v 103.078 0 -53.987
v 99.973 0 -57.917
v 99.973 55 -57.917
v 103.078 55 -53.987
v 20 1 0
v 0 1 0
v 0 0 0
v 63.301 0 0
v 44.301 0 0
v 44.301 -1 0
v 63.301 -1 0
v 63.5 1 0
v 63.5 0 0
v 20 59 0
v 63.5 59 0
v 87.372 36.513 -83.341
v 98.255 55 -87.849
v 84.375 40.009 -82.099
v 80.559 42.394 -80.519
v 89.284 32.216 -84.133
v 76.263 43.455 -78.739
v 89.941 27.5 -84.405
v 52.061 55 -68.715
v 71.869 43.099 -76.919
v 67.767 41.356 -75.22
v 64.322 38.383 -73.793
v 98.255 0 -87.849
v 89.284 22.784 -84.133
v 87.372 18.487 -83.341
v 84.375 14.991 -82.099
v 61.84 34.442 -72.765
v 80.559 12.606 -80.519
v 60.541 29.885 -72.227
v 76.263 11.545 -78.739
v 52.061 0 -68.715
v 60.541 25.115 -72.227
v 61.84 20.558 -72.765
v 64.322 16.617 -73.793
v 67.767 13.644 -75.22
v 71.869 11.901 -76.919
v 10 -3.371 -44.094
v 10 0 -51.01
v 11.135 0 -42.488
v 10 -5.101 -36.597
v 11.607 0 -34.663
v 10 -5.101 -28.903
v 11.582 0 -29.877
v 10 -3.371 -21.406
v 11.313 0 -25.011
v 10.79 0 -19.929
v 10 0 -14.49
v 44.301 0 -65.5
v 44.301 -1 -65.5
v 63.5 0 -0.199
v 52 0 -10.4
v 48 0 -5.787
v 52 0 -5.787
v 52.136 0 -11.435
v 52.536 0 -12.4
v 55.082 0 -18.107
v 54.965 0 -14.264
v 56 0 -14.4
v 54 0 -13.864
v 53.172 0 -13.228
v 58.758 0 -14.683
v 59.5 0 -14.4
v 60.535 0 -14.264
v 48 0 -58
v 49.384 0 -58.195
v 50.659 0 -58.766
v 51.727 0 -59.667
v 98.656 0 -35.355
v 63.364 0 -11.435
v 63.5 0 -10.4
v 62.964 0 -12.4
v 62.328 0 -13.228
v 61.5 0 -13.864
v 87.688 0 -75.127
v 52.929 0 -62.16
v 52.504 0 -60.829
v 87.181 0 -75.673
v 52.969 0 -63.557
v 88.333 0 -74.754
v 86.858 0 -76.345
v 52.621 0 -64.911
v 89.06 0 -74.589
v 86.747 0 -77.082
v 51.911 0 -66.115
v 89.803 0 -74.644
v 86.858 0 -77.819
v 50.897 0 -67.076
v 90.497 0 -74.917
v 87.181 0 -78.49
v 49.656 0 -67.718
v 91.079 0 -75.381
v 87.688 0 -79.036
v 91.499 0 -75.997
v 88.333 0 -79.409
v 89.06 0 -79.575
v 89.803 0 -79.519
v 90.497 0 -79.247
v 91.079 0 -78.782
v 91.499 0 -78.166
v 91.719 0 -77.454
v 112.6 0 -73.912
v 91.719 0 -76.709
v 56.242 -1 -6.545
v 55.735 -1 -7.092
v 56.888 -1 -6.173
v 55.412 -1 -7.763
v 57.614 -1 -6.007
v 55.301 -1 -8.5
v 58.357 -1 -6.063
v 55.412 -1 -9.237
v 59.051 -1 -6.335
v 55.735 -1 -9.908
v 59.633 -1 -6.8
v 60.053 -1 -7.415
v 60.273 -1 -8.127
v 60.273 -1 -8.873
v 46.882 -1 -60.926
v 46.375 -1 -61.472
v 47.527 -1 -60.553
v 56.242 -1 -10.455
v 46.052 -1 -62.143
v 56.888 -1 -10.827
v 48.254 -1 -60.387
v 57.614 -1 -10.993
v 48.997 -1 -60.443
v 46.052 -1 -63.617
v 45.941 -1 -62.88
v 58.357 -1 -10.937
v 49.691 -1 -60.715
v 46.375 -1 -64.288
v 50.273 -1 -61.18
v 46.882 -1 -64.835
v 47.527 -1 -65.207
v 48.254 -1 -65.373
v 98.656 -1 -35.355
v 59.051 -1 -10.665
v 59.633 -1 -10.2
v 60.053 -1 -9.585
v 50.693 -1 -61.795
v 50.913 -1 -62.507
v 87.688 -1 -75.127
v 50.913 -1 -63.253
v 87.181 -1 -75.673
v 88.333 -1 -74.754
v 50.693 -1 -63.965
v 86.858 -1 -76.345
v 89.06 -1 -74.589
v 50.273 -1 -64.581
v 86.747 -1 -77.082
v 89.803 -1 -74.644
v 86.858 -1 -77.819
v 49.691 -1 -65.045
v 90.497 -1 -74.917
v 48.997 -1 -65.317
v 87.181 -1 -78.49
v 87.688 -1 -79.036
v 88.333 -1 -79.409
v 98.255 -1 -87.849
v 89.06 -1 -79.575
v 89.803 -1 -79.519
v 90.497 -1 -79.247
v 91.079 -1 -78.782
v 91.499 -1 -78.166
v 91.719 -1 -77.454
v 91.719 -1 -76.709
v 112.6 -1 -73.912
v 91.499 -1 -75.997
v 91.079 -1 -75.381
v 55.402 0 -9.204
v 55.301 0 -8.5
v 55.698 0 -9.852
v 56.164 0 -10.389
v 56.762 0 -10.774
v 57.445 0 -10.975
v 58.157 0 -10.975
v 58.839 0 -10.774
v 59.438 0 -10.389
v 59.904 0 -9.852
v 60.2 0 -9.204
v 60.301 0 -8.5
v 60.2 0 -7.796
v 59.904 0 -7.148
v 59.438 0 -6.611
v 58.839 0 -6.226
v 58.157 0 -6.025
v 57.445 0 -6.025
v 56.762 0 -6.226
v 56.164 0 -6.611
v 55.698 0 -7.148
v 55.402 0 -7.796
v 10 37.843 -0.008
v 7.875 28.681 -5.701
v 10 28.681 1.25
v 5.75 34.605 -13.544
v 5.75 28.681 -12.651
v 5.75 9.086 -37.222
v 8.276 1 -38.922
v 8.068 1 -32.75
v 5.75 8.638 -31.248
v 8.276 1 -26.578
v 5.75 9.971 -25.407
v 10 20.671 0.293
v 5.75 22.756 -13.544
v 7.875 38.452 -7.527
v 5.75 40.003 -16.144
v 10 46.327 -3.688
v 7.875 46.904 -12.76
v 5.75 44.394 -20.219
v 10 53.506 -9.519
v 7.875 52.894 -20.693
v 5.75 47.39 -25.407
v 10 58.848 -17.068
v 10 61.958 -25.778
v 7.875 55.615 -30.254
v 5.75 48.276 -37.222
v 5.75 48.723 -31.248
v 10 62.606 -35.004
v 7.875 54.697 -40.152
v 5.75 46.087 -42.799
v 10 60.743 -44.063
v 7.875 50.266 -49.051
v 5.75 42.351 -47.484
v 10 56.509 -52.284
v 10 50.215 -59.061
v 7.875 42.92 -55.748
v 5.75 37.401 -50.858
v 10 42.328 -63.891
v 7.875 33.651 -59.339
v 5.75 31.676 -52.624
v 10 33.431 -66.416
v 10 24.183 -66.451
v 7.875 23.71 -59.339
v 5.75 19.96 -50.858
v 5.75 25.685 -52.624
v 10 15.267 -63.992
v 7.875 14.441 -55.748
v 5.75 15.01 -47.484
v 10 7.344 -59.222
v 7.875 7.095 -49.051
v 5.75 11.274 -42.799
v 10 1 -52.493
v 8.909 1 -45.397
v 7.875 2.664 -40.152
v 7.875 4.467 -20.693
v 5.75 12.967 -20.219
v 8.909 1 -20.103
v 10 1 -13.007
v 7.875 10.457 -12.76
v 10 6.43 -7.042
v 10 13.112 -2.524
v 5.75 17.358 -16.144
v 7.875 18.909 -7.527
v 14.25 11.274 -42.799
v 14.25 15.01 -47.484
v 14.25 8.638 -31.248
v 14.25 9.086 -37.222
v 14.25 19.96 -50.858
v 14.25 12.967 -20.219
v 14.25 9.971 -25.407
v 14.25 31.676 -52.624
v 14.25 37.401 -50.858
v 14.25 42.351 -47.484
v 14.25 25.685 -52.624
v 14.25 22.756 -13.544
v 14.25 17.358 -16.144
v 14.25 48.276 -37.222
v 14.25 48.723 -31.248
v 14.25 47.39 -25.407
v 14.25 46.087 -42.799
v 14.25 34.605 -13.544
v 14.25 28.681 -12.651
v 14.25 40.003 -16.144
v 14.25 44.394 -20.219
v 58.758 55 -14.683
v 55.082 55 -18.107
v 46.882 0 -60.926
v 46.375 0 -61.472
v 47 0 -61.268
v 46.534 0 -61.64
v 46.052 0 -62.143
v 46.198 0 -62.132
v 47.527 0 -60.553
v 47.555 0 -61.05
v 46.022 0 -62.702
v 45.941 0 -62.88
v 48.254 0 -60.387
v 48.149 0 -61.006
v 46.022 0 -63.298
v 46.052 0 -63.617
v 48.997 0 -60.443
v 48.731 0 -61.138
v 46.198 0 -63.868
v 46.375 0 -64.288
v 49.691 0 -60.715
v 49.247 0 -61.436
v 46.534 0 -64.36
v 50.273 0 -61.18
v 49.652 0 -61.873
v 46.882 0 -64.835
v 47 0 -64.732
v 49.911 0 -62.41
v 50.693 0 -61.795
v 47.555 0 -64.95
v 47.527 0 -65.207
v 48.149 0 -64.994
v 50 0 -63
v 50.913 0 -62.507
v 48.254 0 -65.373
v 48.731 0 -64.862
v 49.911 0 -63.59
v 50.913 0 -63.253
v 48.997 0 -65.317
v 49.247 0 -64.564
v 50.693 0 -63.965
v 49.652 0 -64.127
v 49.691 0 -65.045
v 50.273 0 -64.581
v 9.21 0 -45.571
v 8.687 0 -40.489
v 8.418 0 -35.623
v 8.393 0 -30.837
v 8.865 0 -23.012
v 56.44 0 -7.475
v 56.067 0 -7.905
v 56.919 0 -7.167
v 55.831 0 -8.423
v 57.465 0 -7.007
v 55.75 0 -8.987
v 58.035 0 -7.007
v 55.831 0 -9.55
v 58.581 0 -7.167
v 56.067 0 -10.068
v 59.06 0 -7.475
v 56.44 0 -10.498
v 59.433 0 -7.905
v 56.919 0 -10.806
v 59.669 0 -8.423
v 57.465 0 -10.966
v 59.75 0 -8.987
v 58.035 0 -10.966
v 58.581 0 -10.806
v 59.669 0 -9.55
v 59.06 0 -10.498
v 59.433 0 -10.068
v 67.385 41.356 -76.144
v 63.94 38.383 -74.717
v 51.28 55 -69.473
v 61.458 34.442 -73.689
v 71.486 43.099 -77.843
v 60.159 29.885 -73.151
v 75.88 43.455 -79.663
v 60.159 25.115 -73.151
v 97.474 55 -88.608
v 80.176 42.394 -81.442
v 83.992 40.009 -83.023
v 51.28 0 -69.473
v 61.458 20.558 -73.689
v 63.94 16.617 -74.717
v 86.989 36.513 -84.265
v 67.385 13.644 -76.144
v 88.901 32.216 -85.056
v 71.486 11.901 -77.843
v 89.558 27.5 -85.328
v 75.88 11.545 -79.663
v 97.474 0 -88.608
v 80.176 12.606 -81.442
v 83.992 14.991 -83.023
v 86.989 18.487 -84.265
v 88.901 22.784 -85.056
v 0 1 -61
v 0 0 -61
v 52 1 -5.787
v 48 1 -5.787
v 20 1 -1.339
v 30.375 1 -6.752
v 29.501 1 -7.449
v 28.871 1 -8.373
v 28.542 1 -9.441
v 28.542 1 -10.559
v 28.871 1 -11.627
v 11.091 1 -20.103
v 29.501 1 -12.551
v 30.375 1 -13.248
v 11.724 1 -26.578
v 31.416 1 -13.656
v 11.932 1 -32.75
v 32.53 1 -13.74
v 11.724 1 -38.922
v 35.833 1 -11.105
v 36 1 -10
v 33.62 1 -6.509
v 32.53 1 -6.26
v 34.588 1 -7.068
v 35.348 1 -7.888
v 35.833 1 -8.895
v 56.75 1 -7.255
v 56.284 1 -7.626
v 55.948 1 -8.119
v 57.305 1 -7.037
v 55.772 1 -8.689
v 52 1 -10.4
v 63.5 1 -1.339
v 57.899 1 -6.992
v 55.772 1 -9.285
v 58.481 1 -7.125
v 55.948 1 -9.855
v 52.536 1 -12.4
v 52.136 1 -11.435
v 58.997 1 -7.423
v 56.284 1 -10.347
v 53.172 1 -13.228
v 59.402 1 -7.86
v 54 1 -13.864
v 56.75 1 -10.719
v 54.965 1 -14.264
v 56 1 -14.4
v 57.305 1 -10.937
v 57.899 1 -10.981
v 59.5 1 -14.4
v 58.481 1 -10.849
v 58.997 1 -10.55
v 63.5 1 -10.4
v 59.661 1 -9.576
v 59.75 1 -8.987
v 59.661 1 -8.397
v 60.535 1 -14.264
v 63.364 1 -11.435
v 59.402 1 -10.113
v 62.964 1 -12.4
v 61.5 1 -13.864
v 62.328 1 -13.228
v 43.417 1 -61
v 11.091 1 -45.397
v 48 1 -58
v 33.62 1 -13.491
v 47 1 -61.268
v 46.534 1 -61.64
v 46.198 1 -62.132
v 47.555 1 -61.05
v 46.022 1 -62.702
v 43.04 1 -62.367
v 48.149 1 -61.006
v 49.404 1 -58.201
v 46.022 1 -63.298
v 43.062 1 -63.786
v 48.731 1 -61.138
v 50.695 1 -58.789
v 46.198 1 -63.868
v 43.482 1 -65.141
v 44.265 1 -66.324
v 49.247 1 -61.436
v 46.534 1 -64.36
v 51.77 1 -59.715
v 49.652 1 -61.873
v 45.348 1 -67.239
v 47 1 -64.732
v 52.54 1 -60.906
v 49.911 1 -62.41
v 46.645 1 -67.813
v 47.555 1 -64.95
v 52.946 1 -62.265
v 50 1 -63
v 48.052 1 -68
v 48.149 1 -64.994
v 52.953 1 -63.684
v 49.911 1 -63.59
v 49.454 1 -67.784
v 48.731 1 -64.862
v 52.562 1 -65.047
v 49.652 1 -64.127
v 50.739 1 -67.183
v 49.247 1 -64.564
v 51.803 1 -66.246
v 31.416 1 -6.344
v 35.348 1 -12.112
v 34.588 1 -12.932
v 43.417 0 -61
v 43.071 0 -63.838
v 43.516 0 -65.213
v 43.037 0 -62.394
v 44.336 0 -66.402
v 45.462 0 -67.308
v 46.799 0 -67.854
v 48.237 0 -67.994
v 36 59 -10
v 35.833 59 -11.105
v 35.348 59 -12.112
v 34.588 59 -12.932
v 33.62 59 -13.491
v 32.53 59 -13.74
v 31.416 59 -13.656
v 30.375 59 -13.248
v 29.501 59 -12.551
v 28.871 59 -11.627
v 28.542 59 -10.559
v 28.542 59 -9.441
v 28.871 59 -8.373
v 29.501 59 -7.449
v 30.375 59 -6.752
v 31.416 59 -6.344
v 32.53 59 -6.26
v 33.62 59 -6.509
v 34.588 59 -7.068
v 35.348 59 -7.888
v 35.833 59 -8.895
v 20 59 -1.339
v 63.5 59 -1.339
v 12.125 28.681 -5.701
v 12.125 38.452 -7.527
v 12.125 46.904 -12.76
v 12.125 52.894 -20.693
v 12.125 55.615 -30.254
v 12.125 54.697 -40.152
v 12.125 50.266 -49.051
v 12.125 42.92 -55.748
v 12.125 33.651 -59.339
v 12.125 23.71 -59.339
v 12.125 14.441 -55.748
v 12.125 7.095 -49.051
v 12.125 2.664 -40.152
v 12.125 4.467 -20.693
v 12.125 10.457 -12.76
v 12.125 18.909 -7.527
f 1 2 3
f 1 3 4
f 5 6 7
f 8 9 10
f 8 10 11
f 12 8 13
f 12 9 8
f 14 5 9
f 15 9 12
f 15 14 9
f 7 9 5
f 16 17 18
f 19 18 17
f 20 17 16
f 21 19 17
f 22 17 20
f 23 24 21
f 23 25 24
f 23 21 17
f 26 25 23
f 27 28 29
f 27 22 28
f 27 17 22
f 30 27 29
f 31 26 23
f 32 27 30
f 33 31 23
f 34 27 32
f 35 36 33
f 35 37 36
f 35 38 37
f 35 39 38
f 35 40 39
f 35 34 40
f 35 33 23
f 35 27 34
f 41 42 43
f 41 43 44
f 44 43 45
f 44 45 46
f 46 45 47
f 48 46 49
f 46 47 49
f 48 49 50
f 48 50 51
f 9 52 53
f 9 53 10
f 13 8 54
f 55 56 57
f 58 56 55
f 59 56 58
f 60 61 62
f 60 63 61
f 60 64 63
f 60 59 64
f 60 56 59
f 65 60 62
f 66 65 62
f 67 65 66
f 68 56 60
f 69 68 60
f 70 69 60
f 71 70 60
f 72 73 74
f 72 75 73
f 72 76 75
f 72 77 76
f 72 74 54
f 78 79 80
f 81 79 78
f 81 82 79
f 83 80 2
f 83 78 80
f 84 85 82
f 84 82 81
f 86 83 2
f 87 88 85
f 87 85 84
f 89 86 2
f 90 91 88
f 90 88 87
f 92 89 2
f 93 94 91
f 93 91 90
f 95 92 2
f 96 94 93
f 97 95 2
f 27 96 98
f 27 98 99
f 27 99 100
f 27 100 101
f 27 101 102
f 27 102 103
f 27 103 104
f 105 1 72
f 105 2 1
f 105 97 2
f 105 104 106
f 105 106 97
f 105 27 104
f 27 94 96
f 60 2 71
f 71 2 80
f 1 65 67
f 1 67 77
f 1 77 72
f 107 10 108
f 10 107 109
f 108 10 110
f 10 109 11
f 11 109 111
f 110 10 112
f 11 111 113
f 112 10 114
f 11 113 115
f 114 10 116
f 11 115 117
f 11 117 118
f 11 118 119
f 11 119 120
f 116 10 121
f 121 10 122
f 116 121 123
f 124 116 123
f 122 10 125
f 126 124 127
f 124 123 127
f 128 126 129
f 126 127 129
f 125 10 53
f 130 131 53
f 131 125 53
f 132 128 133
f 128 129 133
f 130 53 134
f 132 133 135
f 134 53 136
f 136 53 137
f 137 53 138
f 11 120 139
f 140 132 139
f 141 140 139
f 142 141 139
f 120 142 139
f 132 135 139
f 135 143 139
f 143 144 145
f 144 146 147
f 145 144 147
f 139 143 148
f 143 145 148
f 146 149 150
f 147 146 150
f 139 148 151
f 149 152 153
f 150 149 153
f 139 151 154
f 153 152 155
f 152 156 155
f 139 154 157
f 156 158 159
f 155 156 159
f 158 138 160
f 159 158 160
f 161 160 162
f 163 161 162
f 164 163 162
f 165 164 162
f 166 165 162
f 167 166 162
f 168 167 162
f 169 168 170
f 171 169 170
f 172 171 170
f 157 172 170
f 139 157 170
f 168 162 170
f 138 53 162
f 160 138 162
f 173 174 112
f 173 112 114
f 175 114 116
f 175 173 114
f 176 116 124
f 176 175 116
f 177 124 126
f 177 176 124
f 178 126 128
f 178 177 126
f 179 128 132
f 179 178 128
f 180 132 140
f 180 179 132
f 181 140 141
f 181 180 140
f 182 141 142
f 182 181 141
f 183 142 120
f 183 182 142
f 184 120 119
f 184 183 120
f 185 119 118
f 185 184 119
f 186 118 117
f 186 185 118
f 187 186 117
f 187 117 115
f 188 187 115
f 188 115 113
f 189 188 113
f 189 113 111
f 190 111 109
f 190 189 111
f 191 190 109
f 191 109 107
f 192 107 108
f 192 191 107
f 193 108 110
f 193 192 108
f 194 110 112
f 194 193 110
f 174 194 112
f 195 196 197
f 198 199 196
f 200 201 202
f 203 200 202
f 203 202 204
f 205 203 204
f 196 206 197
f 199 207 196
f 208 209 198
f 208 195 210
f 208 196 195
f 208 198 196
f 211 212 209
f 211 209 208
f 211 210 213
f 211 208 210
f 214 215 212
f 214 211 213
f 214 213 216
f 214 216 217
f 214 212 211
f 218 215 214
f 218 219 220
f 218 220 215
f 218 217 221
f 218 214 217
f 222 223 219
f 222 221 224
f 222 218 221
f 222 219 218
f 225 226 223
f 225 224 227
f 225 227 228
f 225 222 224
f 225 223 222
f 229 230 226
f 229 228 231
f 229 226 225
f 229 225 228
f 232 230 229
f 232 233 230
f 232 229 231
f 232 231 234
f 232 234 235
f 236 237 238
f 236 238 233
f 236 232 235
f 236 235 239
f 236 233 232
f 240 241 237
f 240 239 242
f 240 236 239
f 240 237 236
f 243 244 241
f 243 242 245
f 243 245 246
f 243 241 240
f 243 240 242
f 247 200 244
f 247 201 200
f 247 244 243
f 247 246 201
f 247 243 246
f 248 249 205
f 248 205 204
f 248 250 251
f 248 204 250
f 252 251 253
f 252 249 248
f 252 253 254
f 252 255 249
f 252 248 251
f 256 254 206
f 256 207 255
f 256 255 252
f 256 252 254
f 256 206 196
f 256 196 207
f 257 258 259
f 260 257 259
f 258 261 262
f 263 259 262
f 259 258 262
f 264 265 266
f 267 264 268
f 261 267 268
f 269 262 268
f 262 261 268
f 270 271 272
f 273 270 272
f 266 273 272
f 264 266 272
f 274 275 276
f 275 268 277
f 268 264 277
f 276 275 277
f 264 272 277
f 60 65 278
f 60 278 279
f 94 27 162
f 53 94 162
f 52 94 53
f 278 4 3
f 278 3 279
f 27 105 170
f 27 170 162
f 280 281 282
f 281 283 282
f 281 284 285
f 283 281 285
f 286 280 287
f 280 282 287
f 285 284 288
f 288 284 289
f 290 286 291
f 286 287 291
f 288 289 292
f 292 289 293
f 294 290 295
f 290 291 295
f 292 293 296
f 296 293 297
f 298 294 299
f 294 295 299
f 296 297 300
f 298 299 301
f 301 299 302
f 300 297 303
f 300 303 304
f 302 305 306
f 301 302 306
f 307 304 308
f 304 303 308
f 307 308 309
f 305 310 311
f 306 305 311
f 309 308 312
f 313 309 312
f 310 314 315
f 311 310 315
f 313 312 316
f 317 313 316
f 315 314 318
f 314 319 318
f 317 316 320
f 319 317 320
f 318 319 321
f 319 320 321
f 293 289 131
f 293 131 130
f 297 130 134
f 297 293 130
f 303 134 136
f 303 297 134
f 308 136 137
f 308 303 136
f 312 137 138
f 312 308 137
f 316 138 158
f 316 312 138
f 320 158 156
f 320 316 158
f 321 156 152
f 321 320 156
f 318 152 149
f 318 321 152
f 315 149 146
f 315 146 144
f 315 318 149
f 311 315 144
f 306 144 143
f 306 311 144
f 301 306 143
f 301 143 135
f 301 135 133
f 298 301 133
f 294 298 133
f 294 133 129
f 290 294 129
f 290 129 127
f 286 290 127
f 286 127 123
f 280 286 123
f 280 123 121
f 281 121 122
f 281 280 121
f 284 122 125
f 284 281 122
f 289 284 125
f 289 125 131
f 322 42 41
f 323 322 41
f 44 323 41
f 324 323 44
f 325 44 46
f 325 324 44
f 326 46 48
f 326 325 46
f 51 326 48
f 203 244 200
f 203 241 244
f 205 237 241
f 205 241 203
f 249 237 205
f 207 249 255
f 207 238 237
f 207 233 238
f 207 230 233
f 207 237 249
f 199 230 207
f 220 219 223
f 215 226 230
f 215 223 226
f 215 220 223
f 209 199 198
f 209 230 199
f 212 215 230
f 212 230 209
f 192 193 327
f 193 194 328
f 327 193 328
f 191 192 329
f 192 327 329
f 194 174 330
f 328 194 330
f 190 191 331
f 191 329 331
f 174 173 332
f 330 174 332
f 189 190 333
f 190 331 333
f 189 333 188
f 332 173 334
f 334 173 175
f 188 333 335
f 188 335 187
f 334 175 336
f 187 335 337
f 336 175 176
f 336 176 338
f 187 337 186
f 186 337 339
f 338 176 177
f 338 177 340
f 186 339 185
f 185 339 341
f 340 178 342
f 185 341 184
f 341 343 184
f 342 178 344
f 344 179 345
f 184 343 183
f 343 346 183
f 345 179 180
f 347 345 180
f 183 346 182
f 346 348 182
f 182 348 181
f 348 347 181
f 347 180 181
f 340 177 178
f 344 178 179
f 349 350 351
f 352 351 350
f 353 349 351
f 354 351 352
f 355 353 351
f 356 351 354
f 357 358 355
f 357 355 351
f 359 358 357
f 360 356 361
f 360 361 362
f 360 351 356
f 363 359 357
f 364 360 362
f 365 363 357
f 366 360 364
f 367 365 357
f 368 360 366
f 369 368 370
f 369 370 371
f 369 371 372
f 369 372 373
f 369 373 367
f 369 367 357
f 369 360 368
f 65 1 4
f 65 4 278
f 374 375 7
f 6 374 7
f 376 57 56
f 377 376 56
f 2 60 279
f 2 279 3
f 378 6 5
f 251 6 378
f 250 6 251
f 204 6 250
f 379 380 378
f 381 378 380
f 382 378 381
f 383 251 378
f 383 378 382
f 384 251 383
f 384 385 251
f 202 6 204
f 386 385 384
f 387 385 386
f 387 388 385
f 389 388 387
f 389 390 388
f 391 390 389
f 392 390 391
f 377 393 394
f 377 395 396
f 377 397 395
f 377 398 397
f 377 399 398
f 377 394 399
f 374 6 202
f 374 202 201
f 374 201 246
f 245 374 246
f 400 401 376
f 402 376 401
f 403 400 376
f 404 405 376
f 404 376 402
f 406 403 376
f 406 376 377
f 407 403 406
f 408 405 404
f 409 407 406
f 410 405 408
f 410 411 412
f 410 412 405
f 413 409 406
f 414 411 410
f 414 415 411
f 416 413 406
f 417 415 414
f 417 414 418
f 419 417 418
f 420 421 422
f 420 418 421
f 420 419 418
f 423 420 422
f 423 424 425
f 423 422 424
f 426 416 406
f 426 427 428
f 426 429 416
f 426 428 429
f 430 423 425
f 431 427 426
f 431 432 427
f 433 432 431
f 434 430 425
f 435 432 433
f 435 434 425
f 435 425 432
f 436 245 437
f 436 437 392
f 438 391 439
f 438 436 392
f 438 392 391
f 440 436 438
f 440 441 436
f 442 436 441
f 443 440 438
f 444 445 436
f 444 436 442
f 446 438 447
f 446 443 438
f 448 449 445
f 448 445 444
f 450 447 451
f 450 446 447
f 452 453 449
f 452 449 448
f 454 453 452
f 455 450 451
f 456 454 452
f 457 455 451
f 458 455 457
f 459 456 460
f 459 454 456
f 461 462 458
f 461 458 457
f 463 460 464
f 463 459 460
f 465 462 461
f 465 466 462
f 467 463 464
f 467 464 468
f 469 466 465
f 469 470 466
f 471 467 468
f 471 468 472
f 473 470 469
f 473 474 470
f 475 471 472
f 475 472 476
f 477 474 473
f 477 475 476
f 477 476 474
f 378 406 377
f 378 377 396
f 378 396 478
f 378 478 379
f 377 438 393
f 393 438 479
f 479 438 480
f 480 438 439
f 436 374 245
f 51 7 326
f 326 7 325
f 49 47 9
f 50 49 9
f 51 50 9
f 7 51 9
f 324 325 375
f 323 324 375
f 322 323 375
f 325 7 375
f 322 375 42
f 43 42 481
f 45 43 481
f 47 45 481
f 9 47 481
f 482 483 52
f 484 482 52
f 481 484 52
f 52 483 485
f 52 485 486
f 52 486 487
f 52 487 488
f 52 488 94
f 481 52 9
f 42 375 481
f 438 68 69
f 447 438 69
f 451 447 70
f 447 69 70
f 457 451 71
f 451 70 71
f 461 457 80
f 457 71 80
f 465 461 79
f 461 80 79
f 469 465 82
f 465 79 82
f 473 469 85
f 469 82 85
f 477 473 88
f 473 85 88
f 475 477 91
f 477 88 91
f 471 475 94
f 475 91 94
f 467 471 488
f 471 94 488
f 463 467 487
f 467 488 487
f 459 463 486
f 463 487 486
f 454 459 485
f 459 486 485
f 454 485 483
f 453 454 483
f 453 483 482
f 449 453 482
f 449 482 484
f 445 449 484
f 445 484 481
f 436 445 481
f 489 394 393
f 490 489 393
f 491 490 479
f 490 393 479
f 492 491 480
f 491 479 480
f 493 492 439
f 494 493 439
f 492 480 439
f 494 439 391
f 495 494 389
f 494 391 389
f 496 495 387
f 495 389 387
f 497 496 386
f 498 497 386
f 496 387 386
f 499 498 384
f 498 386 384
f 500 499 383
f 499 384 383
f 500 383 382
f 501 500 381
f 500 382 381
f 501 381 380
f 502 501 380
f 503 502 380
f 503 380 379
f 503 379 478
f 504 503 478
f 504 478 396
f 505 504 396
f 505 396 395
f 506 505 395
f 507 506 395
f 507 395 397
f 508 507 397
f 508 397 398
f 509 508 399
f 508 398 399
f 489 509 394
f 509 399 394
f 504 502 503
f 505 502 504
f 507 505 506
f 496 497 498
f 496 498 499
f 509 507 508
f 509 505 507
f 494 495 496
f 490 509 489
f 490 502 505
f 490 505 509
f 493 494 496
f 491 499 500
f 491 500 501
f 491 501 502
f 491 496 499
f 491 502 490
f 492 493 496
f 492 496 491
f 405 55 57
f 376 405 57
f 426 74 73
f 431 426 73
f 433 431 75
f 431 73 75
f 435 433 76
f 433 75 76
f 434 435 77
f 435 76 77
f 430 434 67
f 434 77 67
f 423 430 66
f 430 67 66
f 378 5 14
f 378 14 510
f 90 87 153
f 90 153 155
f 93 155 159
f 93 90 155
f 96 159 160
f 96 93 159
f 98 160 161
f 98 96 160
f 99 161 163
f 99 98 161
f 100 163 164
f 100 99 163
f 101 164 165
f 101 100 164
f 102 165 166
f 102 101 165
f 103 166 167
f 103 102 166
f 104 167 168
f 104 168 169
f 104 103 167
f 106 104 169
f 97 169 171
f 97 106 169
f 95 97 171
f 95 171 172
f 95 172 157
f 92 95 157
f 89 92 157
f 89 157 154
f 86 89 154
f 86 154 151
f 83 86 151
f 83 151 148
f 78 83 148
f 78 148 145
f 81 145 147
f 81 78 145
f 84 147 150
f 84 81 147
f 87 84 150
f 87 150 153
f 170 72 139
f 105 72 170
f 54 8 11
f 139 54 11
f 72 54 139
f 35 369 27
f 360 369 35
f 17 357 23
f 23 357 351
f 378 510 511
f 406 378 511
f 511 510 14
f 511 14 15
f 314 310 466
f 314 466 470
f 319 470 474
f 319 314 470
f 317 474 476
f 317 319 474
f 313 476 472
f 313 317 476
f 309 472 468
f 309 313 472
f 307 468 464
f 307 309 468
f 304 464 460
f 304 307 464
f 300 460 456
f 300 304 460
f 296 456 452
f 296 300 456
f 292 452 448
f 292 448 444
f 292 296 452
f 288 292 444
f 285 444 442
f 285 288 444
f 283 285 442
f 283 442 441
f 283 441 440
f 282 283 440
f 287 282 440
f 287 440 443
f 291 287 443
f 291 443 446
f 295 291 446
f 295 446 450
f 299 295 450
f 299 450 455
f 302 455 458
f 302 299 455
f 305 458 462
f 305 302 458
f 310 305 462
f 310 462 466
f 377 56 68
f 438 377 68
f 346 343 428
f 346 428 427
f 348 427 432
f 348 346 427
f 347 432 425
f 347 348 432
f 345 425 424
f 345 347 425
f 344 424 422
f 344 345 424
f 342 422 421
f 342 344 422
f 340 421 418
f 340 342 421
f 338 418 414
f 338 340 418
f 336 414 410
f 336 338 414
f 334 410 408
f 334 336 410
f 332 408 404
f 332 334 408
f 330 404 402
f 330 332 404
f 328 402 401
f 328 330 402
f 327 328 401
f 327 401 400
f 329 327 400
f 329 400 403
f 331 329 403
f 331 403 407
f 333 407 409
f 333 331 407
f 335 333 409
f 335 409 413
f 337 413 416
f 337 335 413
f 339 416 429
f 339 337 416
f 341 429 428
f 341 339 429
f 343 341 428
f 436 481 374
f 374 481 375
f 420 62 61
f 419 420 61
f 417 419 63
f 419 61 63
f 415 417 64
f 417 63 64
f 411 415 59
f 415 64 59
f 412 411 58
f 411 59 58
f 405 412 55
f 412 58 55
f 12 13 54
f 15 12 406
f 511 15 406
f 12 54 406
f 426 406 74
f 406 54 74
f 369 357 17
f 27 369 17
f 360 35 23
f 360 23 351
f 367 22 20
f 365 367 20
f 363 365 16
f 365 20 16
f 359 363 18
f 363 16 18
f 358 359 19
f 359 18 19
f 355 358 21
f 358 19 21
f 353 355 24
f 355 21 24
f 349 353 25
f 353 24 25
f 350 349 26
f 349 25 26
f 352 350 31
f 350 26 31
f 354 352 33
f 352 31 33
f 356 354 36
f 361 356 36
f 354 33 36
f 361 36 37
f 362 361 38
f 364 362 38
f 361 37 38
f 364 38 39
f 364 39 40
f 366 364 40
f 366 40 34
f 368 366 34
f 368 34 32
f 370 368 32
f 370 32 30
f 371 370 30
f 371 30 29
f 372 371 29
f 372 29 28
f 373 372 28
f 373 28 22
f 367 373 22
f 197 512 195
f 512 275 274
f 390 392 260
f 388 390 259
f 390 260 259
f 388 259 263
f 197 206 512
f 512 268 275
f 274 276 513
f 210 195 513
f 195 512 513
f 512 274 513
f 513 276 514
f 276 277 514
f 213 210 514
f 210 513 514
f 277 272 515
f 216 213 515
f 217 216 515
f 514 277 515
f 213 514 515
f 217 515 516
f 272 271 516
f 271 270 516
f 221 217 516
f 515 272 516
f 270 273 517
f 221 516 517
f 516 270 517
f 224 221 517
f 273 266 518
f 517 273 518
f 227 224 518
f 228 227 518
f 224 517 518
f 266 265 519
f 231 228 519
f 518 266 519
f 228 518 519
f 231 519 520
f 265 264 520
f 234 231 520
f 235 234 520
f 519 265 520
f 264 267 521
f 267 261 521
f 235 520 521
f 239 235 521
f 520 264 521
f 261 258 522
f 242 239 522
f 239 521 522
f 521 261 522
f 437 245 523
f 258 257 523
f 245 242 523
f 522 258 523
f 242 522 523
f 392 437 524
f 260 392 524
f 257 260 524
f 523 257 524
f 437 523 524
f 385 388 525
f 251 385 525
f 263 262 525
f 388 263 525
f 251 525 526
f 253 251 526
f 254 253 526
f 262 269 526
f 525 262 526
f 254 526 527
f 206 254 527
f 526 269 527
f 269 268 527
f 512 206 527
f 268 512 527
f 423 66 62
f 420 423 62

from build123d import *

# Parameters (mm, degrees)
CROQUIS1_R                        = 2
SALIENTE_EXTRUIR1_DEPTH           = 1
CROQUIS2_W                        = 43.5
CROQUIS2_H                        = 1.339346309
SALIENTE_EXTRUIR2_DEPTH           = 58
CROQUIS3_R                        = 2.5
SALIENTE_EXTRUIR3_DEPTH           = 1
SALIENTE_EXTRUIR4_DEPTH           = 55
CROQUIS5_R                        = 16
CORTAR_EXTRUIR1_DEPTH             = 55
SALIENTE_EXTRUIR5_DEPTH           = 55
CROQUIS7_R                        = 34
SALIENTE_EXTRUIR6_DEPTH           = 4.25
SALIENTE_EXTRUIR6_TAPER           = 73
SALIENTE_EXTRUIR6_OTHER_WAY_DEPTH = 4.25
SALIENTE_EXTRUIR6_OTHER_WAY_TAPER = 73
CROQUIS8_R                        = 3.75
SALIENTE_EXTRUIR7_DEPTH           = 58


with BuildPart() as part:
    # Croquis1 → Saliente-Extruir1 (new body)
    with BuildSketch(Plane(origin=(0, 0, 0), x_dir=(1, 0, 0), z_dir=(0, 1, 0))):
        with BuildLine():
            Line((0, 0), (48, 0))
            Line((48, 0), (53, 0))
            Line((53, 0), (63.5, 0))
            Line((63.5, 0), (63.5, 10.4))
            ThreePointArc((63.5, 10.4), (62.328427125, 13.228427125), (59.5, 14.4))
            Line((59.5, 14.4), (56, 14.4))
            ThreePointArc((56, 14.4), (53.171572875, 13.228427125), (52, 10.4))
            Line((52, 10.4), (52, 5.787095104))
            Line((52, 5.787095104), (48, 5.787095104))
            Line((48, 5.787095104), (48, 58))
            ThreePointArc((48, 58), (50.738612788, 67.183300133), (43.417424305, 61))
            Line((43.417424305, 61), (0, 61))
            Line((0, 61), (0, 0))
        make_face()
        with Locations((48, 63)):
            Circle(CROQUIS1_R, mode=Mode.SUBTRACT)
        with Locations((57.75, 8.986759655)):
            Circle(CROQUIS1_R, mode=Mode.SUBTRACT)
    extrude(amount=SALIENTE_EXTRUIR1_DEPTH)

    # Croquis2 → Saliente-Extruir2 (add)
    with BuildSketch(Plane(origin=(0, 1, 0), x_dir=(1, 0, 0), z_dir=(0, 1, 0))):
        with Locations((41.75, 0.669673155)):
            Rectangle(CROQUIS2_W, CROQUIS2_H)
    extrude(amount=SALIENTE_EXTRUIR2_DEPTH)

    # Croquis3 → Saliente-Extruir3 (add)
    with BuildSketch(Plane(origin=(0, 0, 0), x_dir=(-1, 0, 0), z_dir=(0, -1, 0))):
        Polygon((-44.300855822, 65.5), (-44.300855822, 0), (-63.300855822, 0), (-98.656194881, 35.355339059), (-112.599600943, 73.911550328), (-98.25542052, 87.84871245), align=None)
        with Locations((-57.800855822, 8.5)):
            Circle(CROQUIS3_R, mode=Mode.SUBTRACT)
        with Locations((-48.440552847, 62.880089861)):
            Circle(CROQUIS3_R, mode=Mode.SUBTRACT)
        with Locations((-89.246749654, 77.081649496)):
            Circle(CROQUIS3_R, mode=Mode.SUBTRACT)
    extrude(amount=SALIENTE_EXTRUIR3_DEPTH)

    # Croquis6 → Saliente-Extruir5 (add)
    with BuildSketch(Plane(origin=(0, 0, 0), x_dir=(1, 0, 0), z_dir=(0, 1, 0))):
        Polygon((55.082395563, 18.10659262), (99.972967283, 57.916598531), (103.078159084, 53.987437255), (58.758126029, 14.683398339), align=None)
    extrude(amount=SALIENTE_EXTRUIR5_DEPTH)

    # Croquis7 → Saliente-Extruir6 (add)
    with BuildSketch(Plane.ZY.offset(-10)):
        with Locations((-32.75, 28.680559434)):
            Circle(CROQUIS7_R)
    extrude(amount=SALIENTE_EXTRUIR6_DEPTH, taper=SALIENTE_EXTRUIR6_TAPER)

    # Croquis7 → Saliente-Extruir6 other way (add)
    with BuildSketch(Plane.ZY.offset(-10)):
        with Locations((-32.75, 28.680559434)):
            Circle(CROQUIS7_R)
    extrude(amount=-SALIENTE_EXTRUIR6_OTHER_WAY_DEPTH, taper=SALIENTE_EXTRUIR6_OTHER_WAY_TAPER)

    # Croquis8 → Saliente-Extruir7 (add)
    with BuildSketch(Plane(origin=(0, 1, 0), x_dir=(1, 0, 0), z_dir=(0, 1, 0))):
        with Locations((32.25, 10)):
            Circle(CROQUIS8_R)
    extrude(amount=SALIENTE_EXTRUIR7_DEPTH)


with BuildPart() as body_2:
    # Croquis4 → Saliente-Extruir4 (new body)
    with BuildSketch(Plane(origin=(0, 0, 0), x_dir=(1, 0, 0), z_dir=(0, 1, 0))):
        Polygon((51.280406083, 69.473416578), (97.474382708, 88.607588196), (98.25542052, 87.84871245), (52.061443895, 68.714540832), align=None)
    extrude(amount=SALIENTE_EXTRUIR4_DEPTH)

    # Croquis5 → Cortar-Extruir1 (cut)
    with BuildSketch(Plane(origin=(-16.670036955, 0, -40.245029302), x_dir=(0.923879533, 0, -0.382683432), z_dir=(0.382683432, 0, 0.923879533))):
        with Locations((99.394418786, 27.5)):
            Circle(CROQUIS5_R)
    extrude(amount=-CORTAR_EXTRUIR1_DEPTH, mode=Mode.SUBTRACT)


solid = Compound([part.part, body_2.part])
